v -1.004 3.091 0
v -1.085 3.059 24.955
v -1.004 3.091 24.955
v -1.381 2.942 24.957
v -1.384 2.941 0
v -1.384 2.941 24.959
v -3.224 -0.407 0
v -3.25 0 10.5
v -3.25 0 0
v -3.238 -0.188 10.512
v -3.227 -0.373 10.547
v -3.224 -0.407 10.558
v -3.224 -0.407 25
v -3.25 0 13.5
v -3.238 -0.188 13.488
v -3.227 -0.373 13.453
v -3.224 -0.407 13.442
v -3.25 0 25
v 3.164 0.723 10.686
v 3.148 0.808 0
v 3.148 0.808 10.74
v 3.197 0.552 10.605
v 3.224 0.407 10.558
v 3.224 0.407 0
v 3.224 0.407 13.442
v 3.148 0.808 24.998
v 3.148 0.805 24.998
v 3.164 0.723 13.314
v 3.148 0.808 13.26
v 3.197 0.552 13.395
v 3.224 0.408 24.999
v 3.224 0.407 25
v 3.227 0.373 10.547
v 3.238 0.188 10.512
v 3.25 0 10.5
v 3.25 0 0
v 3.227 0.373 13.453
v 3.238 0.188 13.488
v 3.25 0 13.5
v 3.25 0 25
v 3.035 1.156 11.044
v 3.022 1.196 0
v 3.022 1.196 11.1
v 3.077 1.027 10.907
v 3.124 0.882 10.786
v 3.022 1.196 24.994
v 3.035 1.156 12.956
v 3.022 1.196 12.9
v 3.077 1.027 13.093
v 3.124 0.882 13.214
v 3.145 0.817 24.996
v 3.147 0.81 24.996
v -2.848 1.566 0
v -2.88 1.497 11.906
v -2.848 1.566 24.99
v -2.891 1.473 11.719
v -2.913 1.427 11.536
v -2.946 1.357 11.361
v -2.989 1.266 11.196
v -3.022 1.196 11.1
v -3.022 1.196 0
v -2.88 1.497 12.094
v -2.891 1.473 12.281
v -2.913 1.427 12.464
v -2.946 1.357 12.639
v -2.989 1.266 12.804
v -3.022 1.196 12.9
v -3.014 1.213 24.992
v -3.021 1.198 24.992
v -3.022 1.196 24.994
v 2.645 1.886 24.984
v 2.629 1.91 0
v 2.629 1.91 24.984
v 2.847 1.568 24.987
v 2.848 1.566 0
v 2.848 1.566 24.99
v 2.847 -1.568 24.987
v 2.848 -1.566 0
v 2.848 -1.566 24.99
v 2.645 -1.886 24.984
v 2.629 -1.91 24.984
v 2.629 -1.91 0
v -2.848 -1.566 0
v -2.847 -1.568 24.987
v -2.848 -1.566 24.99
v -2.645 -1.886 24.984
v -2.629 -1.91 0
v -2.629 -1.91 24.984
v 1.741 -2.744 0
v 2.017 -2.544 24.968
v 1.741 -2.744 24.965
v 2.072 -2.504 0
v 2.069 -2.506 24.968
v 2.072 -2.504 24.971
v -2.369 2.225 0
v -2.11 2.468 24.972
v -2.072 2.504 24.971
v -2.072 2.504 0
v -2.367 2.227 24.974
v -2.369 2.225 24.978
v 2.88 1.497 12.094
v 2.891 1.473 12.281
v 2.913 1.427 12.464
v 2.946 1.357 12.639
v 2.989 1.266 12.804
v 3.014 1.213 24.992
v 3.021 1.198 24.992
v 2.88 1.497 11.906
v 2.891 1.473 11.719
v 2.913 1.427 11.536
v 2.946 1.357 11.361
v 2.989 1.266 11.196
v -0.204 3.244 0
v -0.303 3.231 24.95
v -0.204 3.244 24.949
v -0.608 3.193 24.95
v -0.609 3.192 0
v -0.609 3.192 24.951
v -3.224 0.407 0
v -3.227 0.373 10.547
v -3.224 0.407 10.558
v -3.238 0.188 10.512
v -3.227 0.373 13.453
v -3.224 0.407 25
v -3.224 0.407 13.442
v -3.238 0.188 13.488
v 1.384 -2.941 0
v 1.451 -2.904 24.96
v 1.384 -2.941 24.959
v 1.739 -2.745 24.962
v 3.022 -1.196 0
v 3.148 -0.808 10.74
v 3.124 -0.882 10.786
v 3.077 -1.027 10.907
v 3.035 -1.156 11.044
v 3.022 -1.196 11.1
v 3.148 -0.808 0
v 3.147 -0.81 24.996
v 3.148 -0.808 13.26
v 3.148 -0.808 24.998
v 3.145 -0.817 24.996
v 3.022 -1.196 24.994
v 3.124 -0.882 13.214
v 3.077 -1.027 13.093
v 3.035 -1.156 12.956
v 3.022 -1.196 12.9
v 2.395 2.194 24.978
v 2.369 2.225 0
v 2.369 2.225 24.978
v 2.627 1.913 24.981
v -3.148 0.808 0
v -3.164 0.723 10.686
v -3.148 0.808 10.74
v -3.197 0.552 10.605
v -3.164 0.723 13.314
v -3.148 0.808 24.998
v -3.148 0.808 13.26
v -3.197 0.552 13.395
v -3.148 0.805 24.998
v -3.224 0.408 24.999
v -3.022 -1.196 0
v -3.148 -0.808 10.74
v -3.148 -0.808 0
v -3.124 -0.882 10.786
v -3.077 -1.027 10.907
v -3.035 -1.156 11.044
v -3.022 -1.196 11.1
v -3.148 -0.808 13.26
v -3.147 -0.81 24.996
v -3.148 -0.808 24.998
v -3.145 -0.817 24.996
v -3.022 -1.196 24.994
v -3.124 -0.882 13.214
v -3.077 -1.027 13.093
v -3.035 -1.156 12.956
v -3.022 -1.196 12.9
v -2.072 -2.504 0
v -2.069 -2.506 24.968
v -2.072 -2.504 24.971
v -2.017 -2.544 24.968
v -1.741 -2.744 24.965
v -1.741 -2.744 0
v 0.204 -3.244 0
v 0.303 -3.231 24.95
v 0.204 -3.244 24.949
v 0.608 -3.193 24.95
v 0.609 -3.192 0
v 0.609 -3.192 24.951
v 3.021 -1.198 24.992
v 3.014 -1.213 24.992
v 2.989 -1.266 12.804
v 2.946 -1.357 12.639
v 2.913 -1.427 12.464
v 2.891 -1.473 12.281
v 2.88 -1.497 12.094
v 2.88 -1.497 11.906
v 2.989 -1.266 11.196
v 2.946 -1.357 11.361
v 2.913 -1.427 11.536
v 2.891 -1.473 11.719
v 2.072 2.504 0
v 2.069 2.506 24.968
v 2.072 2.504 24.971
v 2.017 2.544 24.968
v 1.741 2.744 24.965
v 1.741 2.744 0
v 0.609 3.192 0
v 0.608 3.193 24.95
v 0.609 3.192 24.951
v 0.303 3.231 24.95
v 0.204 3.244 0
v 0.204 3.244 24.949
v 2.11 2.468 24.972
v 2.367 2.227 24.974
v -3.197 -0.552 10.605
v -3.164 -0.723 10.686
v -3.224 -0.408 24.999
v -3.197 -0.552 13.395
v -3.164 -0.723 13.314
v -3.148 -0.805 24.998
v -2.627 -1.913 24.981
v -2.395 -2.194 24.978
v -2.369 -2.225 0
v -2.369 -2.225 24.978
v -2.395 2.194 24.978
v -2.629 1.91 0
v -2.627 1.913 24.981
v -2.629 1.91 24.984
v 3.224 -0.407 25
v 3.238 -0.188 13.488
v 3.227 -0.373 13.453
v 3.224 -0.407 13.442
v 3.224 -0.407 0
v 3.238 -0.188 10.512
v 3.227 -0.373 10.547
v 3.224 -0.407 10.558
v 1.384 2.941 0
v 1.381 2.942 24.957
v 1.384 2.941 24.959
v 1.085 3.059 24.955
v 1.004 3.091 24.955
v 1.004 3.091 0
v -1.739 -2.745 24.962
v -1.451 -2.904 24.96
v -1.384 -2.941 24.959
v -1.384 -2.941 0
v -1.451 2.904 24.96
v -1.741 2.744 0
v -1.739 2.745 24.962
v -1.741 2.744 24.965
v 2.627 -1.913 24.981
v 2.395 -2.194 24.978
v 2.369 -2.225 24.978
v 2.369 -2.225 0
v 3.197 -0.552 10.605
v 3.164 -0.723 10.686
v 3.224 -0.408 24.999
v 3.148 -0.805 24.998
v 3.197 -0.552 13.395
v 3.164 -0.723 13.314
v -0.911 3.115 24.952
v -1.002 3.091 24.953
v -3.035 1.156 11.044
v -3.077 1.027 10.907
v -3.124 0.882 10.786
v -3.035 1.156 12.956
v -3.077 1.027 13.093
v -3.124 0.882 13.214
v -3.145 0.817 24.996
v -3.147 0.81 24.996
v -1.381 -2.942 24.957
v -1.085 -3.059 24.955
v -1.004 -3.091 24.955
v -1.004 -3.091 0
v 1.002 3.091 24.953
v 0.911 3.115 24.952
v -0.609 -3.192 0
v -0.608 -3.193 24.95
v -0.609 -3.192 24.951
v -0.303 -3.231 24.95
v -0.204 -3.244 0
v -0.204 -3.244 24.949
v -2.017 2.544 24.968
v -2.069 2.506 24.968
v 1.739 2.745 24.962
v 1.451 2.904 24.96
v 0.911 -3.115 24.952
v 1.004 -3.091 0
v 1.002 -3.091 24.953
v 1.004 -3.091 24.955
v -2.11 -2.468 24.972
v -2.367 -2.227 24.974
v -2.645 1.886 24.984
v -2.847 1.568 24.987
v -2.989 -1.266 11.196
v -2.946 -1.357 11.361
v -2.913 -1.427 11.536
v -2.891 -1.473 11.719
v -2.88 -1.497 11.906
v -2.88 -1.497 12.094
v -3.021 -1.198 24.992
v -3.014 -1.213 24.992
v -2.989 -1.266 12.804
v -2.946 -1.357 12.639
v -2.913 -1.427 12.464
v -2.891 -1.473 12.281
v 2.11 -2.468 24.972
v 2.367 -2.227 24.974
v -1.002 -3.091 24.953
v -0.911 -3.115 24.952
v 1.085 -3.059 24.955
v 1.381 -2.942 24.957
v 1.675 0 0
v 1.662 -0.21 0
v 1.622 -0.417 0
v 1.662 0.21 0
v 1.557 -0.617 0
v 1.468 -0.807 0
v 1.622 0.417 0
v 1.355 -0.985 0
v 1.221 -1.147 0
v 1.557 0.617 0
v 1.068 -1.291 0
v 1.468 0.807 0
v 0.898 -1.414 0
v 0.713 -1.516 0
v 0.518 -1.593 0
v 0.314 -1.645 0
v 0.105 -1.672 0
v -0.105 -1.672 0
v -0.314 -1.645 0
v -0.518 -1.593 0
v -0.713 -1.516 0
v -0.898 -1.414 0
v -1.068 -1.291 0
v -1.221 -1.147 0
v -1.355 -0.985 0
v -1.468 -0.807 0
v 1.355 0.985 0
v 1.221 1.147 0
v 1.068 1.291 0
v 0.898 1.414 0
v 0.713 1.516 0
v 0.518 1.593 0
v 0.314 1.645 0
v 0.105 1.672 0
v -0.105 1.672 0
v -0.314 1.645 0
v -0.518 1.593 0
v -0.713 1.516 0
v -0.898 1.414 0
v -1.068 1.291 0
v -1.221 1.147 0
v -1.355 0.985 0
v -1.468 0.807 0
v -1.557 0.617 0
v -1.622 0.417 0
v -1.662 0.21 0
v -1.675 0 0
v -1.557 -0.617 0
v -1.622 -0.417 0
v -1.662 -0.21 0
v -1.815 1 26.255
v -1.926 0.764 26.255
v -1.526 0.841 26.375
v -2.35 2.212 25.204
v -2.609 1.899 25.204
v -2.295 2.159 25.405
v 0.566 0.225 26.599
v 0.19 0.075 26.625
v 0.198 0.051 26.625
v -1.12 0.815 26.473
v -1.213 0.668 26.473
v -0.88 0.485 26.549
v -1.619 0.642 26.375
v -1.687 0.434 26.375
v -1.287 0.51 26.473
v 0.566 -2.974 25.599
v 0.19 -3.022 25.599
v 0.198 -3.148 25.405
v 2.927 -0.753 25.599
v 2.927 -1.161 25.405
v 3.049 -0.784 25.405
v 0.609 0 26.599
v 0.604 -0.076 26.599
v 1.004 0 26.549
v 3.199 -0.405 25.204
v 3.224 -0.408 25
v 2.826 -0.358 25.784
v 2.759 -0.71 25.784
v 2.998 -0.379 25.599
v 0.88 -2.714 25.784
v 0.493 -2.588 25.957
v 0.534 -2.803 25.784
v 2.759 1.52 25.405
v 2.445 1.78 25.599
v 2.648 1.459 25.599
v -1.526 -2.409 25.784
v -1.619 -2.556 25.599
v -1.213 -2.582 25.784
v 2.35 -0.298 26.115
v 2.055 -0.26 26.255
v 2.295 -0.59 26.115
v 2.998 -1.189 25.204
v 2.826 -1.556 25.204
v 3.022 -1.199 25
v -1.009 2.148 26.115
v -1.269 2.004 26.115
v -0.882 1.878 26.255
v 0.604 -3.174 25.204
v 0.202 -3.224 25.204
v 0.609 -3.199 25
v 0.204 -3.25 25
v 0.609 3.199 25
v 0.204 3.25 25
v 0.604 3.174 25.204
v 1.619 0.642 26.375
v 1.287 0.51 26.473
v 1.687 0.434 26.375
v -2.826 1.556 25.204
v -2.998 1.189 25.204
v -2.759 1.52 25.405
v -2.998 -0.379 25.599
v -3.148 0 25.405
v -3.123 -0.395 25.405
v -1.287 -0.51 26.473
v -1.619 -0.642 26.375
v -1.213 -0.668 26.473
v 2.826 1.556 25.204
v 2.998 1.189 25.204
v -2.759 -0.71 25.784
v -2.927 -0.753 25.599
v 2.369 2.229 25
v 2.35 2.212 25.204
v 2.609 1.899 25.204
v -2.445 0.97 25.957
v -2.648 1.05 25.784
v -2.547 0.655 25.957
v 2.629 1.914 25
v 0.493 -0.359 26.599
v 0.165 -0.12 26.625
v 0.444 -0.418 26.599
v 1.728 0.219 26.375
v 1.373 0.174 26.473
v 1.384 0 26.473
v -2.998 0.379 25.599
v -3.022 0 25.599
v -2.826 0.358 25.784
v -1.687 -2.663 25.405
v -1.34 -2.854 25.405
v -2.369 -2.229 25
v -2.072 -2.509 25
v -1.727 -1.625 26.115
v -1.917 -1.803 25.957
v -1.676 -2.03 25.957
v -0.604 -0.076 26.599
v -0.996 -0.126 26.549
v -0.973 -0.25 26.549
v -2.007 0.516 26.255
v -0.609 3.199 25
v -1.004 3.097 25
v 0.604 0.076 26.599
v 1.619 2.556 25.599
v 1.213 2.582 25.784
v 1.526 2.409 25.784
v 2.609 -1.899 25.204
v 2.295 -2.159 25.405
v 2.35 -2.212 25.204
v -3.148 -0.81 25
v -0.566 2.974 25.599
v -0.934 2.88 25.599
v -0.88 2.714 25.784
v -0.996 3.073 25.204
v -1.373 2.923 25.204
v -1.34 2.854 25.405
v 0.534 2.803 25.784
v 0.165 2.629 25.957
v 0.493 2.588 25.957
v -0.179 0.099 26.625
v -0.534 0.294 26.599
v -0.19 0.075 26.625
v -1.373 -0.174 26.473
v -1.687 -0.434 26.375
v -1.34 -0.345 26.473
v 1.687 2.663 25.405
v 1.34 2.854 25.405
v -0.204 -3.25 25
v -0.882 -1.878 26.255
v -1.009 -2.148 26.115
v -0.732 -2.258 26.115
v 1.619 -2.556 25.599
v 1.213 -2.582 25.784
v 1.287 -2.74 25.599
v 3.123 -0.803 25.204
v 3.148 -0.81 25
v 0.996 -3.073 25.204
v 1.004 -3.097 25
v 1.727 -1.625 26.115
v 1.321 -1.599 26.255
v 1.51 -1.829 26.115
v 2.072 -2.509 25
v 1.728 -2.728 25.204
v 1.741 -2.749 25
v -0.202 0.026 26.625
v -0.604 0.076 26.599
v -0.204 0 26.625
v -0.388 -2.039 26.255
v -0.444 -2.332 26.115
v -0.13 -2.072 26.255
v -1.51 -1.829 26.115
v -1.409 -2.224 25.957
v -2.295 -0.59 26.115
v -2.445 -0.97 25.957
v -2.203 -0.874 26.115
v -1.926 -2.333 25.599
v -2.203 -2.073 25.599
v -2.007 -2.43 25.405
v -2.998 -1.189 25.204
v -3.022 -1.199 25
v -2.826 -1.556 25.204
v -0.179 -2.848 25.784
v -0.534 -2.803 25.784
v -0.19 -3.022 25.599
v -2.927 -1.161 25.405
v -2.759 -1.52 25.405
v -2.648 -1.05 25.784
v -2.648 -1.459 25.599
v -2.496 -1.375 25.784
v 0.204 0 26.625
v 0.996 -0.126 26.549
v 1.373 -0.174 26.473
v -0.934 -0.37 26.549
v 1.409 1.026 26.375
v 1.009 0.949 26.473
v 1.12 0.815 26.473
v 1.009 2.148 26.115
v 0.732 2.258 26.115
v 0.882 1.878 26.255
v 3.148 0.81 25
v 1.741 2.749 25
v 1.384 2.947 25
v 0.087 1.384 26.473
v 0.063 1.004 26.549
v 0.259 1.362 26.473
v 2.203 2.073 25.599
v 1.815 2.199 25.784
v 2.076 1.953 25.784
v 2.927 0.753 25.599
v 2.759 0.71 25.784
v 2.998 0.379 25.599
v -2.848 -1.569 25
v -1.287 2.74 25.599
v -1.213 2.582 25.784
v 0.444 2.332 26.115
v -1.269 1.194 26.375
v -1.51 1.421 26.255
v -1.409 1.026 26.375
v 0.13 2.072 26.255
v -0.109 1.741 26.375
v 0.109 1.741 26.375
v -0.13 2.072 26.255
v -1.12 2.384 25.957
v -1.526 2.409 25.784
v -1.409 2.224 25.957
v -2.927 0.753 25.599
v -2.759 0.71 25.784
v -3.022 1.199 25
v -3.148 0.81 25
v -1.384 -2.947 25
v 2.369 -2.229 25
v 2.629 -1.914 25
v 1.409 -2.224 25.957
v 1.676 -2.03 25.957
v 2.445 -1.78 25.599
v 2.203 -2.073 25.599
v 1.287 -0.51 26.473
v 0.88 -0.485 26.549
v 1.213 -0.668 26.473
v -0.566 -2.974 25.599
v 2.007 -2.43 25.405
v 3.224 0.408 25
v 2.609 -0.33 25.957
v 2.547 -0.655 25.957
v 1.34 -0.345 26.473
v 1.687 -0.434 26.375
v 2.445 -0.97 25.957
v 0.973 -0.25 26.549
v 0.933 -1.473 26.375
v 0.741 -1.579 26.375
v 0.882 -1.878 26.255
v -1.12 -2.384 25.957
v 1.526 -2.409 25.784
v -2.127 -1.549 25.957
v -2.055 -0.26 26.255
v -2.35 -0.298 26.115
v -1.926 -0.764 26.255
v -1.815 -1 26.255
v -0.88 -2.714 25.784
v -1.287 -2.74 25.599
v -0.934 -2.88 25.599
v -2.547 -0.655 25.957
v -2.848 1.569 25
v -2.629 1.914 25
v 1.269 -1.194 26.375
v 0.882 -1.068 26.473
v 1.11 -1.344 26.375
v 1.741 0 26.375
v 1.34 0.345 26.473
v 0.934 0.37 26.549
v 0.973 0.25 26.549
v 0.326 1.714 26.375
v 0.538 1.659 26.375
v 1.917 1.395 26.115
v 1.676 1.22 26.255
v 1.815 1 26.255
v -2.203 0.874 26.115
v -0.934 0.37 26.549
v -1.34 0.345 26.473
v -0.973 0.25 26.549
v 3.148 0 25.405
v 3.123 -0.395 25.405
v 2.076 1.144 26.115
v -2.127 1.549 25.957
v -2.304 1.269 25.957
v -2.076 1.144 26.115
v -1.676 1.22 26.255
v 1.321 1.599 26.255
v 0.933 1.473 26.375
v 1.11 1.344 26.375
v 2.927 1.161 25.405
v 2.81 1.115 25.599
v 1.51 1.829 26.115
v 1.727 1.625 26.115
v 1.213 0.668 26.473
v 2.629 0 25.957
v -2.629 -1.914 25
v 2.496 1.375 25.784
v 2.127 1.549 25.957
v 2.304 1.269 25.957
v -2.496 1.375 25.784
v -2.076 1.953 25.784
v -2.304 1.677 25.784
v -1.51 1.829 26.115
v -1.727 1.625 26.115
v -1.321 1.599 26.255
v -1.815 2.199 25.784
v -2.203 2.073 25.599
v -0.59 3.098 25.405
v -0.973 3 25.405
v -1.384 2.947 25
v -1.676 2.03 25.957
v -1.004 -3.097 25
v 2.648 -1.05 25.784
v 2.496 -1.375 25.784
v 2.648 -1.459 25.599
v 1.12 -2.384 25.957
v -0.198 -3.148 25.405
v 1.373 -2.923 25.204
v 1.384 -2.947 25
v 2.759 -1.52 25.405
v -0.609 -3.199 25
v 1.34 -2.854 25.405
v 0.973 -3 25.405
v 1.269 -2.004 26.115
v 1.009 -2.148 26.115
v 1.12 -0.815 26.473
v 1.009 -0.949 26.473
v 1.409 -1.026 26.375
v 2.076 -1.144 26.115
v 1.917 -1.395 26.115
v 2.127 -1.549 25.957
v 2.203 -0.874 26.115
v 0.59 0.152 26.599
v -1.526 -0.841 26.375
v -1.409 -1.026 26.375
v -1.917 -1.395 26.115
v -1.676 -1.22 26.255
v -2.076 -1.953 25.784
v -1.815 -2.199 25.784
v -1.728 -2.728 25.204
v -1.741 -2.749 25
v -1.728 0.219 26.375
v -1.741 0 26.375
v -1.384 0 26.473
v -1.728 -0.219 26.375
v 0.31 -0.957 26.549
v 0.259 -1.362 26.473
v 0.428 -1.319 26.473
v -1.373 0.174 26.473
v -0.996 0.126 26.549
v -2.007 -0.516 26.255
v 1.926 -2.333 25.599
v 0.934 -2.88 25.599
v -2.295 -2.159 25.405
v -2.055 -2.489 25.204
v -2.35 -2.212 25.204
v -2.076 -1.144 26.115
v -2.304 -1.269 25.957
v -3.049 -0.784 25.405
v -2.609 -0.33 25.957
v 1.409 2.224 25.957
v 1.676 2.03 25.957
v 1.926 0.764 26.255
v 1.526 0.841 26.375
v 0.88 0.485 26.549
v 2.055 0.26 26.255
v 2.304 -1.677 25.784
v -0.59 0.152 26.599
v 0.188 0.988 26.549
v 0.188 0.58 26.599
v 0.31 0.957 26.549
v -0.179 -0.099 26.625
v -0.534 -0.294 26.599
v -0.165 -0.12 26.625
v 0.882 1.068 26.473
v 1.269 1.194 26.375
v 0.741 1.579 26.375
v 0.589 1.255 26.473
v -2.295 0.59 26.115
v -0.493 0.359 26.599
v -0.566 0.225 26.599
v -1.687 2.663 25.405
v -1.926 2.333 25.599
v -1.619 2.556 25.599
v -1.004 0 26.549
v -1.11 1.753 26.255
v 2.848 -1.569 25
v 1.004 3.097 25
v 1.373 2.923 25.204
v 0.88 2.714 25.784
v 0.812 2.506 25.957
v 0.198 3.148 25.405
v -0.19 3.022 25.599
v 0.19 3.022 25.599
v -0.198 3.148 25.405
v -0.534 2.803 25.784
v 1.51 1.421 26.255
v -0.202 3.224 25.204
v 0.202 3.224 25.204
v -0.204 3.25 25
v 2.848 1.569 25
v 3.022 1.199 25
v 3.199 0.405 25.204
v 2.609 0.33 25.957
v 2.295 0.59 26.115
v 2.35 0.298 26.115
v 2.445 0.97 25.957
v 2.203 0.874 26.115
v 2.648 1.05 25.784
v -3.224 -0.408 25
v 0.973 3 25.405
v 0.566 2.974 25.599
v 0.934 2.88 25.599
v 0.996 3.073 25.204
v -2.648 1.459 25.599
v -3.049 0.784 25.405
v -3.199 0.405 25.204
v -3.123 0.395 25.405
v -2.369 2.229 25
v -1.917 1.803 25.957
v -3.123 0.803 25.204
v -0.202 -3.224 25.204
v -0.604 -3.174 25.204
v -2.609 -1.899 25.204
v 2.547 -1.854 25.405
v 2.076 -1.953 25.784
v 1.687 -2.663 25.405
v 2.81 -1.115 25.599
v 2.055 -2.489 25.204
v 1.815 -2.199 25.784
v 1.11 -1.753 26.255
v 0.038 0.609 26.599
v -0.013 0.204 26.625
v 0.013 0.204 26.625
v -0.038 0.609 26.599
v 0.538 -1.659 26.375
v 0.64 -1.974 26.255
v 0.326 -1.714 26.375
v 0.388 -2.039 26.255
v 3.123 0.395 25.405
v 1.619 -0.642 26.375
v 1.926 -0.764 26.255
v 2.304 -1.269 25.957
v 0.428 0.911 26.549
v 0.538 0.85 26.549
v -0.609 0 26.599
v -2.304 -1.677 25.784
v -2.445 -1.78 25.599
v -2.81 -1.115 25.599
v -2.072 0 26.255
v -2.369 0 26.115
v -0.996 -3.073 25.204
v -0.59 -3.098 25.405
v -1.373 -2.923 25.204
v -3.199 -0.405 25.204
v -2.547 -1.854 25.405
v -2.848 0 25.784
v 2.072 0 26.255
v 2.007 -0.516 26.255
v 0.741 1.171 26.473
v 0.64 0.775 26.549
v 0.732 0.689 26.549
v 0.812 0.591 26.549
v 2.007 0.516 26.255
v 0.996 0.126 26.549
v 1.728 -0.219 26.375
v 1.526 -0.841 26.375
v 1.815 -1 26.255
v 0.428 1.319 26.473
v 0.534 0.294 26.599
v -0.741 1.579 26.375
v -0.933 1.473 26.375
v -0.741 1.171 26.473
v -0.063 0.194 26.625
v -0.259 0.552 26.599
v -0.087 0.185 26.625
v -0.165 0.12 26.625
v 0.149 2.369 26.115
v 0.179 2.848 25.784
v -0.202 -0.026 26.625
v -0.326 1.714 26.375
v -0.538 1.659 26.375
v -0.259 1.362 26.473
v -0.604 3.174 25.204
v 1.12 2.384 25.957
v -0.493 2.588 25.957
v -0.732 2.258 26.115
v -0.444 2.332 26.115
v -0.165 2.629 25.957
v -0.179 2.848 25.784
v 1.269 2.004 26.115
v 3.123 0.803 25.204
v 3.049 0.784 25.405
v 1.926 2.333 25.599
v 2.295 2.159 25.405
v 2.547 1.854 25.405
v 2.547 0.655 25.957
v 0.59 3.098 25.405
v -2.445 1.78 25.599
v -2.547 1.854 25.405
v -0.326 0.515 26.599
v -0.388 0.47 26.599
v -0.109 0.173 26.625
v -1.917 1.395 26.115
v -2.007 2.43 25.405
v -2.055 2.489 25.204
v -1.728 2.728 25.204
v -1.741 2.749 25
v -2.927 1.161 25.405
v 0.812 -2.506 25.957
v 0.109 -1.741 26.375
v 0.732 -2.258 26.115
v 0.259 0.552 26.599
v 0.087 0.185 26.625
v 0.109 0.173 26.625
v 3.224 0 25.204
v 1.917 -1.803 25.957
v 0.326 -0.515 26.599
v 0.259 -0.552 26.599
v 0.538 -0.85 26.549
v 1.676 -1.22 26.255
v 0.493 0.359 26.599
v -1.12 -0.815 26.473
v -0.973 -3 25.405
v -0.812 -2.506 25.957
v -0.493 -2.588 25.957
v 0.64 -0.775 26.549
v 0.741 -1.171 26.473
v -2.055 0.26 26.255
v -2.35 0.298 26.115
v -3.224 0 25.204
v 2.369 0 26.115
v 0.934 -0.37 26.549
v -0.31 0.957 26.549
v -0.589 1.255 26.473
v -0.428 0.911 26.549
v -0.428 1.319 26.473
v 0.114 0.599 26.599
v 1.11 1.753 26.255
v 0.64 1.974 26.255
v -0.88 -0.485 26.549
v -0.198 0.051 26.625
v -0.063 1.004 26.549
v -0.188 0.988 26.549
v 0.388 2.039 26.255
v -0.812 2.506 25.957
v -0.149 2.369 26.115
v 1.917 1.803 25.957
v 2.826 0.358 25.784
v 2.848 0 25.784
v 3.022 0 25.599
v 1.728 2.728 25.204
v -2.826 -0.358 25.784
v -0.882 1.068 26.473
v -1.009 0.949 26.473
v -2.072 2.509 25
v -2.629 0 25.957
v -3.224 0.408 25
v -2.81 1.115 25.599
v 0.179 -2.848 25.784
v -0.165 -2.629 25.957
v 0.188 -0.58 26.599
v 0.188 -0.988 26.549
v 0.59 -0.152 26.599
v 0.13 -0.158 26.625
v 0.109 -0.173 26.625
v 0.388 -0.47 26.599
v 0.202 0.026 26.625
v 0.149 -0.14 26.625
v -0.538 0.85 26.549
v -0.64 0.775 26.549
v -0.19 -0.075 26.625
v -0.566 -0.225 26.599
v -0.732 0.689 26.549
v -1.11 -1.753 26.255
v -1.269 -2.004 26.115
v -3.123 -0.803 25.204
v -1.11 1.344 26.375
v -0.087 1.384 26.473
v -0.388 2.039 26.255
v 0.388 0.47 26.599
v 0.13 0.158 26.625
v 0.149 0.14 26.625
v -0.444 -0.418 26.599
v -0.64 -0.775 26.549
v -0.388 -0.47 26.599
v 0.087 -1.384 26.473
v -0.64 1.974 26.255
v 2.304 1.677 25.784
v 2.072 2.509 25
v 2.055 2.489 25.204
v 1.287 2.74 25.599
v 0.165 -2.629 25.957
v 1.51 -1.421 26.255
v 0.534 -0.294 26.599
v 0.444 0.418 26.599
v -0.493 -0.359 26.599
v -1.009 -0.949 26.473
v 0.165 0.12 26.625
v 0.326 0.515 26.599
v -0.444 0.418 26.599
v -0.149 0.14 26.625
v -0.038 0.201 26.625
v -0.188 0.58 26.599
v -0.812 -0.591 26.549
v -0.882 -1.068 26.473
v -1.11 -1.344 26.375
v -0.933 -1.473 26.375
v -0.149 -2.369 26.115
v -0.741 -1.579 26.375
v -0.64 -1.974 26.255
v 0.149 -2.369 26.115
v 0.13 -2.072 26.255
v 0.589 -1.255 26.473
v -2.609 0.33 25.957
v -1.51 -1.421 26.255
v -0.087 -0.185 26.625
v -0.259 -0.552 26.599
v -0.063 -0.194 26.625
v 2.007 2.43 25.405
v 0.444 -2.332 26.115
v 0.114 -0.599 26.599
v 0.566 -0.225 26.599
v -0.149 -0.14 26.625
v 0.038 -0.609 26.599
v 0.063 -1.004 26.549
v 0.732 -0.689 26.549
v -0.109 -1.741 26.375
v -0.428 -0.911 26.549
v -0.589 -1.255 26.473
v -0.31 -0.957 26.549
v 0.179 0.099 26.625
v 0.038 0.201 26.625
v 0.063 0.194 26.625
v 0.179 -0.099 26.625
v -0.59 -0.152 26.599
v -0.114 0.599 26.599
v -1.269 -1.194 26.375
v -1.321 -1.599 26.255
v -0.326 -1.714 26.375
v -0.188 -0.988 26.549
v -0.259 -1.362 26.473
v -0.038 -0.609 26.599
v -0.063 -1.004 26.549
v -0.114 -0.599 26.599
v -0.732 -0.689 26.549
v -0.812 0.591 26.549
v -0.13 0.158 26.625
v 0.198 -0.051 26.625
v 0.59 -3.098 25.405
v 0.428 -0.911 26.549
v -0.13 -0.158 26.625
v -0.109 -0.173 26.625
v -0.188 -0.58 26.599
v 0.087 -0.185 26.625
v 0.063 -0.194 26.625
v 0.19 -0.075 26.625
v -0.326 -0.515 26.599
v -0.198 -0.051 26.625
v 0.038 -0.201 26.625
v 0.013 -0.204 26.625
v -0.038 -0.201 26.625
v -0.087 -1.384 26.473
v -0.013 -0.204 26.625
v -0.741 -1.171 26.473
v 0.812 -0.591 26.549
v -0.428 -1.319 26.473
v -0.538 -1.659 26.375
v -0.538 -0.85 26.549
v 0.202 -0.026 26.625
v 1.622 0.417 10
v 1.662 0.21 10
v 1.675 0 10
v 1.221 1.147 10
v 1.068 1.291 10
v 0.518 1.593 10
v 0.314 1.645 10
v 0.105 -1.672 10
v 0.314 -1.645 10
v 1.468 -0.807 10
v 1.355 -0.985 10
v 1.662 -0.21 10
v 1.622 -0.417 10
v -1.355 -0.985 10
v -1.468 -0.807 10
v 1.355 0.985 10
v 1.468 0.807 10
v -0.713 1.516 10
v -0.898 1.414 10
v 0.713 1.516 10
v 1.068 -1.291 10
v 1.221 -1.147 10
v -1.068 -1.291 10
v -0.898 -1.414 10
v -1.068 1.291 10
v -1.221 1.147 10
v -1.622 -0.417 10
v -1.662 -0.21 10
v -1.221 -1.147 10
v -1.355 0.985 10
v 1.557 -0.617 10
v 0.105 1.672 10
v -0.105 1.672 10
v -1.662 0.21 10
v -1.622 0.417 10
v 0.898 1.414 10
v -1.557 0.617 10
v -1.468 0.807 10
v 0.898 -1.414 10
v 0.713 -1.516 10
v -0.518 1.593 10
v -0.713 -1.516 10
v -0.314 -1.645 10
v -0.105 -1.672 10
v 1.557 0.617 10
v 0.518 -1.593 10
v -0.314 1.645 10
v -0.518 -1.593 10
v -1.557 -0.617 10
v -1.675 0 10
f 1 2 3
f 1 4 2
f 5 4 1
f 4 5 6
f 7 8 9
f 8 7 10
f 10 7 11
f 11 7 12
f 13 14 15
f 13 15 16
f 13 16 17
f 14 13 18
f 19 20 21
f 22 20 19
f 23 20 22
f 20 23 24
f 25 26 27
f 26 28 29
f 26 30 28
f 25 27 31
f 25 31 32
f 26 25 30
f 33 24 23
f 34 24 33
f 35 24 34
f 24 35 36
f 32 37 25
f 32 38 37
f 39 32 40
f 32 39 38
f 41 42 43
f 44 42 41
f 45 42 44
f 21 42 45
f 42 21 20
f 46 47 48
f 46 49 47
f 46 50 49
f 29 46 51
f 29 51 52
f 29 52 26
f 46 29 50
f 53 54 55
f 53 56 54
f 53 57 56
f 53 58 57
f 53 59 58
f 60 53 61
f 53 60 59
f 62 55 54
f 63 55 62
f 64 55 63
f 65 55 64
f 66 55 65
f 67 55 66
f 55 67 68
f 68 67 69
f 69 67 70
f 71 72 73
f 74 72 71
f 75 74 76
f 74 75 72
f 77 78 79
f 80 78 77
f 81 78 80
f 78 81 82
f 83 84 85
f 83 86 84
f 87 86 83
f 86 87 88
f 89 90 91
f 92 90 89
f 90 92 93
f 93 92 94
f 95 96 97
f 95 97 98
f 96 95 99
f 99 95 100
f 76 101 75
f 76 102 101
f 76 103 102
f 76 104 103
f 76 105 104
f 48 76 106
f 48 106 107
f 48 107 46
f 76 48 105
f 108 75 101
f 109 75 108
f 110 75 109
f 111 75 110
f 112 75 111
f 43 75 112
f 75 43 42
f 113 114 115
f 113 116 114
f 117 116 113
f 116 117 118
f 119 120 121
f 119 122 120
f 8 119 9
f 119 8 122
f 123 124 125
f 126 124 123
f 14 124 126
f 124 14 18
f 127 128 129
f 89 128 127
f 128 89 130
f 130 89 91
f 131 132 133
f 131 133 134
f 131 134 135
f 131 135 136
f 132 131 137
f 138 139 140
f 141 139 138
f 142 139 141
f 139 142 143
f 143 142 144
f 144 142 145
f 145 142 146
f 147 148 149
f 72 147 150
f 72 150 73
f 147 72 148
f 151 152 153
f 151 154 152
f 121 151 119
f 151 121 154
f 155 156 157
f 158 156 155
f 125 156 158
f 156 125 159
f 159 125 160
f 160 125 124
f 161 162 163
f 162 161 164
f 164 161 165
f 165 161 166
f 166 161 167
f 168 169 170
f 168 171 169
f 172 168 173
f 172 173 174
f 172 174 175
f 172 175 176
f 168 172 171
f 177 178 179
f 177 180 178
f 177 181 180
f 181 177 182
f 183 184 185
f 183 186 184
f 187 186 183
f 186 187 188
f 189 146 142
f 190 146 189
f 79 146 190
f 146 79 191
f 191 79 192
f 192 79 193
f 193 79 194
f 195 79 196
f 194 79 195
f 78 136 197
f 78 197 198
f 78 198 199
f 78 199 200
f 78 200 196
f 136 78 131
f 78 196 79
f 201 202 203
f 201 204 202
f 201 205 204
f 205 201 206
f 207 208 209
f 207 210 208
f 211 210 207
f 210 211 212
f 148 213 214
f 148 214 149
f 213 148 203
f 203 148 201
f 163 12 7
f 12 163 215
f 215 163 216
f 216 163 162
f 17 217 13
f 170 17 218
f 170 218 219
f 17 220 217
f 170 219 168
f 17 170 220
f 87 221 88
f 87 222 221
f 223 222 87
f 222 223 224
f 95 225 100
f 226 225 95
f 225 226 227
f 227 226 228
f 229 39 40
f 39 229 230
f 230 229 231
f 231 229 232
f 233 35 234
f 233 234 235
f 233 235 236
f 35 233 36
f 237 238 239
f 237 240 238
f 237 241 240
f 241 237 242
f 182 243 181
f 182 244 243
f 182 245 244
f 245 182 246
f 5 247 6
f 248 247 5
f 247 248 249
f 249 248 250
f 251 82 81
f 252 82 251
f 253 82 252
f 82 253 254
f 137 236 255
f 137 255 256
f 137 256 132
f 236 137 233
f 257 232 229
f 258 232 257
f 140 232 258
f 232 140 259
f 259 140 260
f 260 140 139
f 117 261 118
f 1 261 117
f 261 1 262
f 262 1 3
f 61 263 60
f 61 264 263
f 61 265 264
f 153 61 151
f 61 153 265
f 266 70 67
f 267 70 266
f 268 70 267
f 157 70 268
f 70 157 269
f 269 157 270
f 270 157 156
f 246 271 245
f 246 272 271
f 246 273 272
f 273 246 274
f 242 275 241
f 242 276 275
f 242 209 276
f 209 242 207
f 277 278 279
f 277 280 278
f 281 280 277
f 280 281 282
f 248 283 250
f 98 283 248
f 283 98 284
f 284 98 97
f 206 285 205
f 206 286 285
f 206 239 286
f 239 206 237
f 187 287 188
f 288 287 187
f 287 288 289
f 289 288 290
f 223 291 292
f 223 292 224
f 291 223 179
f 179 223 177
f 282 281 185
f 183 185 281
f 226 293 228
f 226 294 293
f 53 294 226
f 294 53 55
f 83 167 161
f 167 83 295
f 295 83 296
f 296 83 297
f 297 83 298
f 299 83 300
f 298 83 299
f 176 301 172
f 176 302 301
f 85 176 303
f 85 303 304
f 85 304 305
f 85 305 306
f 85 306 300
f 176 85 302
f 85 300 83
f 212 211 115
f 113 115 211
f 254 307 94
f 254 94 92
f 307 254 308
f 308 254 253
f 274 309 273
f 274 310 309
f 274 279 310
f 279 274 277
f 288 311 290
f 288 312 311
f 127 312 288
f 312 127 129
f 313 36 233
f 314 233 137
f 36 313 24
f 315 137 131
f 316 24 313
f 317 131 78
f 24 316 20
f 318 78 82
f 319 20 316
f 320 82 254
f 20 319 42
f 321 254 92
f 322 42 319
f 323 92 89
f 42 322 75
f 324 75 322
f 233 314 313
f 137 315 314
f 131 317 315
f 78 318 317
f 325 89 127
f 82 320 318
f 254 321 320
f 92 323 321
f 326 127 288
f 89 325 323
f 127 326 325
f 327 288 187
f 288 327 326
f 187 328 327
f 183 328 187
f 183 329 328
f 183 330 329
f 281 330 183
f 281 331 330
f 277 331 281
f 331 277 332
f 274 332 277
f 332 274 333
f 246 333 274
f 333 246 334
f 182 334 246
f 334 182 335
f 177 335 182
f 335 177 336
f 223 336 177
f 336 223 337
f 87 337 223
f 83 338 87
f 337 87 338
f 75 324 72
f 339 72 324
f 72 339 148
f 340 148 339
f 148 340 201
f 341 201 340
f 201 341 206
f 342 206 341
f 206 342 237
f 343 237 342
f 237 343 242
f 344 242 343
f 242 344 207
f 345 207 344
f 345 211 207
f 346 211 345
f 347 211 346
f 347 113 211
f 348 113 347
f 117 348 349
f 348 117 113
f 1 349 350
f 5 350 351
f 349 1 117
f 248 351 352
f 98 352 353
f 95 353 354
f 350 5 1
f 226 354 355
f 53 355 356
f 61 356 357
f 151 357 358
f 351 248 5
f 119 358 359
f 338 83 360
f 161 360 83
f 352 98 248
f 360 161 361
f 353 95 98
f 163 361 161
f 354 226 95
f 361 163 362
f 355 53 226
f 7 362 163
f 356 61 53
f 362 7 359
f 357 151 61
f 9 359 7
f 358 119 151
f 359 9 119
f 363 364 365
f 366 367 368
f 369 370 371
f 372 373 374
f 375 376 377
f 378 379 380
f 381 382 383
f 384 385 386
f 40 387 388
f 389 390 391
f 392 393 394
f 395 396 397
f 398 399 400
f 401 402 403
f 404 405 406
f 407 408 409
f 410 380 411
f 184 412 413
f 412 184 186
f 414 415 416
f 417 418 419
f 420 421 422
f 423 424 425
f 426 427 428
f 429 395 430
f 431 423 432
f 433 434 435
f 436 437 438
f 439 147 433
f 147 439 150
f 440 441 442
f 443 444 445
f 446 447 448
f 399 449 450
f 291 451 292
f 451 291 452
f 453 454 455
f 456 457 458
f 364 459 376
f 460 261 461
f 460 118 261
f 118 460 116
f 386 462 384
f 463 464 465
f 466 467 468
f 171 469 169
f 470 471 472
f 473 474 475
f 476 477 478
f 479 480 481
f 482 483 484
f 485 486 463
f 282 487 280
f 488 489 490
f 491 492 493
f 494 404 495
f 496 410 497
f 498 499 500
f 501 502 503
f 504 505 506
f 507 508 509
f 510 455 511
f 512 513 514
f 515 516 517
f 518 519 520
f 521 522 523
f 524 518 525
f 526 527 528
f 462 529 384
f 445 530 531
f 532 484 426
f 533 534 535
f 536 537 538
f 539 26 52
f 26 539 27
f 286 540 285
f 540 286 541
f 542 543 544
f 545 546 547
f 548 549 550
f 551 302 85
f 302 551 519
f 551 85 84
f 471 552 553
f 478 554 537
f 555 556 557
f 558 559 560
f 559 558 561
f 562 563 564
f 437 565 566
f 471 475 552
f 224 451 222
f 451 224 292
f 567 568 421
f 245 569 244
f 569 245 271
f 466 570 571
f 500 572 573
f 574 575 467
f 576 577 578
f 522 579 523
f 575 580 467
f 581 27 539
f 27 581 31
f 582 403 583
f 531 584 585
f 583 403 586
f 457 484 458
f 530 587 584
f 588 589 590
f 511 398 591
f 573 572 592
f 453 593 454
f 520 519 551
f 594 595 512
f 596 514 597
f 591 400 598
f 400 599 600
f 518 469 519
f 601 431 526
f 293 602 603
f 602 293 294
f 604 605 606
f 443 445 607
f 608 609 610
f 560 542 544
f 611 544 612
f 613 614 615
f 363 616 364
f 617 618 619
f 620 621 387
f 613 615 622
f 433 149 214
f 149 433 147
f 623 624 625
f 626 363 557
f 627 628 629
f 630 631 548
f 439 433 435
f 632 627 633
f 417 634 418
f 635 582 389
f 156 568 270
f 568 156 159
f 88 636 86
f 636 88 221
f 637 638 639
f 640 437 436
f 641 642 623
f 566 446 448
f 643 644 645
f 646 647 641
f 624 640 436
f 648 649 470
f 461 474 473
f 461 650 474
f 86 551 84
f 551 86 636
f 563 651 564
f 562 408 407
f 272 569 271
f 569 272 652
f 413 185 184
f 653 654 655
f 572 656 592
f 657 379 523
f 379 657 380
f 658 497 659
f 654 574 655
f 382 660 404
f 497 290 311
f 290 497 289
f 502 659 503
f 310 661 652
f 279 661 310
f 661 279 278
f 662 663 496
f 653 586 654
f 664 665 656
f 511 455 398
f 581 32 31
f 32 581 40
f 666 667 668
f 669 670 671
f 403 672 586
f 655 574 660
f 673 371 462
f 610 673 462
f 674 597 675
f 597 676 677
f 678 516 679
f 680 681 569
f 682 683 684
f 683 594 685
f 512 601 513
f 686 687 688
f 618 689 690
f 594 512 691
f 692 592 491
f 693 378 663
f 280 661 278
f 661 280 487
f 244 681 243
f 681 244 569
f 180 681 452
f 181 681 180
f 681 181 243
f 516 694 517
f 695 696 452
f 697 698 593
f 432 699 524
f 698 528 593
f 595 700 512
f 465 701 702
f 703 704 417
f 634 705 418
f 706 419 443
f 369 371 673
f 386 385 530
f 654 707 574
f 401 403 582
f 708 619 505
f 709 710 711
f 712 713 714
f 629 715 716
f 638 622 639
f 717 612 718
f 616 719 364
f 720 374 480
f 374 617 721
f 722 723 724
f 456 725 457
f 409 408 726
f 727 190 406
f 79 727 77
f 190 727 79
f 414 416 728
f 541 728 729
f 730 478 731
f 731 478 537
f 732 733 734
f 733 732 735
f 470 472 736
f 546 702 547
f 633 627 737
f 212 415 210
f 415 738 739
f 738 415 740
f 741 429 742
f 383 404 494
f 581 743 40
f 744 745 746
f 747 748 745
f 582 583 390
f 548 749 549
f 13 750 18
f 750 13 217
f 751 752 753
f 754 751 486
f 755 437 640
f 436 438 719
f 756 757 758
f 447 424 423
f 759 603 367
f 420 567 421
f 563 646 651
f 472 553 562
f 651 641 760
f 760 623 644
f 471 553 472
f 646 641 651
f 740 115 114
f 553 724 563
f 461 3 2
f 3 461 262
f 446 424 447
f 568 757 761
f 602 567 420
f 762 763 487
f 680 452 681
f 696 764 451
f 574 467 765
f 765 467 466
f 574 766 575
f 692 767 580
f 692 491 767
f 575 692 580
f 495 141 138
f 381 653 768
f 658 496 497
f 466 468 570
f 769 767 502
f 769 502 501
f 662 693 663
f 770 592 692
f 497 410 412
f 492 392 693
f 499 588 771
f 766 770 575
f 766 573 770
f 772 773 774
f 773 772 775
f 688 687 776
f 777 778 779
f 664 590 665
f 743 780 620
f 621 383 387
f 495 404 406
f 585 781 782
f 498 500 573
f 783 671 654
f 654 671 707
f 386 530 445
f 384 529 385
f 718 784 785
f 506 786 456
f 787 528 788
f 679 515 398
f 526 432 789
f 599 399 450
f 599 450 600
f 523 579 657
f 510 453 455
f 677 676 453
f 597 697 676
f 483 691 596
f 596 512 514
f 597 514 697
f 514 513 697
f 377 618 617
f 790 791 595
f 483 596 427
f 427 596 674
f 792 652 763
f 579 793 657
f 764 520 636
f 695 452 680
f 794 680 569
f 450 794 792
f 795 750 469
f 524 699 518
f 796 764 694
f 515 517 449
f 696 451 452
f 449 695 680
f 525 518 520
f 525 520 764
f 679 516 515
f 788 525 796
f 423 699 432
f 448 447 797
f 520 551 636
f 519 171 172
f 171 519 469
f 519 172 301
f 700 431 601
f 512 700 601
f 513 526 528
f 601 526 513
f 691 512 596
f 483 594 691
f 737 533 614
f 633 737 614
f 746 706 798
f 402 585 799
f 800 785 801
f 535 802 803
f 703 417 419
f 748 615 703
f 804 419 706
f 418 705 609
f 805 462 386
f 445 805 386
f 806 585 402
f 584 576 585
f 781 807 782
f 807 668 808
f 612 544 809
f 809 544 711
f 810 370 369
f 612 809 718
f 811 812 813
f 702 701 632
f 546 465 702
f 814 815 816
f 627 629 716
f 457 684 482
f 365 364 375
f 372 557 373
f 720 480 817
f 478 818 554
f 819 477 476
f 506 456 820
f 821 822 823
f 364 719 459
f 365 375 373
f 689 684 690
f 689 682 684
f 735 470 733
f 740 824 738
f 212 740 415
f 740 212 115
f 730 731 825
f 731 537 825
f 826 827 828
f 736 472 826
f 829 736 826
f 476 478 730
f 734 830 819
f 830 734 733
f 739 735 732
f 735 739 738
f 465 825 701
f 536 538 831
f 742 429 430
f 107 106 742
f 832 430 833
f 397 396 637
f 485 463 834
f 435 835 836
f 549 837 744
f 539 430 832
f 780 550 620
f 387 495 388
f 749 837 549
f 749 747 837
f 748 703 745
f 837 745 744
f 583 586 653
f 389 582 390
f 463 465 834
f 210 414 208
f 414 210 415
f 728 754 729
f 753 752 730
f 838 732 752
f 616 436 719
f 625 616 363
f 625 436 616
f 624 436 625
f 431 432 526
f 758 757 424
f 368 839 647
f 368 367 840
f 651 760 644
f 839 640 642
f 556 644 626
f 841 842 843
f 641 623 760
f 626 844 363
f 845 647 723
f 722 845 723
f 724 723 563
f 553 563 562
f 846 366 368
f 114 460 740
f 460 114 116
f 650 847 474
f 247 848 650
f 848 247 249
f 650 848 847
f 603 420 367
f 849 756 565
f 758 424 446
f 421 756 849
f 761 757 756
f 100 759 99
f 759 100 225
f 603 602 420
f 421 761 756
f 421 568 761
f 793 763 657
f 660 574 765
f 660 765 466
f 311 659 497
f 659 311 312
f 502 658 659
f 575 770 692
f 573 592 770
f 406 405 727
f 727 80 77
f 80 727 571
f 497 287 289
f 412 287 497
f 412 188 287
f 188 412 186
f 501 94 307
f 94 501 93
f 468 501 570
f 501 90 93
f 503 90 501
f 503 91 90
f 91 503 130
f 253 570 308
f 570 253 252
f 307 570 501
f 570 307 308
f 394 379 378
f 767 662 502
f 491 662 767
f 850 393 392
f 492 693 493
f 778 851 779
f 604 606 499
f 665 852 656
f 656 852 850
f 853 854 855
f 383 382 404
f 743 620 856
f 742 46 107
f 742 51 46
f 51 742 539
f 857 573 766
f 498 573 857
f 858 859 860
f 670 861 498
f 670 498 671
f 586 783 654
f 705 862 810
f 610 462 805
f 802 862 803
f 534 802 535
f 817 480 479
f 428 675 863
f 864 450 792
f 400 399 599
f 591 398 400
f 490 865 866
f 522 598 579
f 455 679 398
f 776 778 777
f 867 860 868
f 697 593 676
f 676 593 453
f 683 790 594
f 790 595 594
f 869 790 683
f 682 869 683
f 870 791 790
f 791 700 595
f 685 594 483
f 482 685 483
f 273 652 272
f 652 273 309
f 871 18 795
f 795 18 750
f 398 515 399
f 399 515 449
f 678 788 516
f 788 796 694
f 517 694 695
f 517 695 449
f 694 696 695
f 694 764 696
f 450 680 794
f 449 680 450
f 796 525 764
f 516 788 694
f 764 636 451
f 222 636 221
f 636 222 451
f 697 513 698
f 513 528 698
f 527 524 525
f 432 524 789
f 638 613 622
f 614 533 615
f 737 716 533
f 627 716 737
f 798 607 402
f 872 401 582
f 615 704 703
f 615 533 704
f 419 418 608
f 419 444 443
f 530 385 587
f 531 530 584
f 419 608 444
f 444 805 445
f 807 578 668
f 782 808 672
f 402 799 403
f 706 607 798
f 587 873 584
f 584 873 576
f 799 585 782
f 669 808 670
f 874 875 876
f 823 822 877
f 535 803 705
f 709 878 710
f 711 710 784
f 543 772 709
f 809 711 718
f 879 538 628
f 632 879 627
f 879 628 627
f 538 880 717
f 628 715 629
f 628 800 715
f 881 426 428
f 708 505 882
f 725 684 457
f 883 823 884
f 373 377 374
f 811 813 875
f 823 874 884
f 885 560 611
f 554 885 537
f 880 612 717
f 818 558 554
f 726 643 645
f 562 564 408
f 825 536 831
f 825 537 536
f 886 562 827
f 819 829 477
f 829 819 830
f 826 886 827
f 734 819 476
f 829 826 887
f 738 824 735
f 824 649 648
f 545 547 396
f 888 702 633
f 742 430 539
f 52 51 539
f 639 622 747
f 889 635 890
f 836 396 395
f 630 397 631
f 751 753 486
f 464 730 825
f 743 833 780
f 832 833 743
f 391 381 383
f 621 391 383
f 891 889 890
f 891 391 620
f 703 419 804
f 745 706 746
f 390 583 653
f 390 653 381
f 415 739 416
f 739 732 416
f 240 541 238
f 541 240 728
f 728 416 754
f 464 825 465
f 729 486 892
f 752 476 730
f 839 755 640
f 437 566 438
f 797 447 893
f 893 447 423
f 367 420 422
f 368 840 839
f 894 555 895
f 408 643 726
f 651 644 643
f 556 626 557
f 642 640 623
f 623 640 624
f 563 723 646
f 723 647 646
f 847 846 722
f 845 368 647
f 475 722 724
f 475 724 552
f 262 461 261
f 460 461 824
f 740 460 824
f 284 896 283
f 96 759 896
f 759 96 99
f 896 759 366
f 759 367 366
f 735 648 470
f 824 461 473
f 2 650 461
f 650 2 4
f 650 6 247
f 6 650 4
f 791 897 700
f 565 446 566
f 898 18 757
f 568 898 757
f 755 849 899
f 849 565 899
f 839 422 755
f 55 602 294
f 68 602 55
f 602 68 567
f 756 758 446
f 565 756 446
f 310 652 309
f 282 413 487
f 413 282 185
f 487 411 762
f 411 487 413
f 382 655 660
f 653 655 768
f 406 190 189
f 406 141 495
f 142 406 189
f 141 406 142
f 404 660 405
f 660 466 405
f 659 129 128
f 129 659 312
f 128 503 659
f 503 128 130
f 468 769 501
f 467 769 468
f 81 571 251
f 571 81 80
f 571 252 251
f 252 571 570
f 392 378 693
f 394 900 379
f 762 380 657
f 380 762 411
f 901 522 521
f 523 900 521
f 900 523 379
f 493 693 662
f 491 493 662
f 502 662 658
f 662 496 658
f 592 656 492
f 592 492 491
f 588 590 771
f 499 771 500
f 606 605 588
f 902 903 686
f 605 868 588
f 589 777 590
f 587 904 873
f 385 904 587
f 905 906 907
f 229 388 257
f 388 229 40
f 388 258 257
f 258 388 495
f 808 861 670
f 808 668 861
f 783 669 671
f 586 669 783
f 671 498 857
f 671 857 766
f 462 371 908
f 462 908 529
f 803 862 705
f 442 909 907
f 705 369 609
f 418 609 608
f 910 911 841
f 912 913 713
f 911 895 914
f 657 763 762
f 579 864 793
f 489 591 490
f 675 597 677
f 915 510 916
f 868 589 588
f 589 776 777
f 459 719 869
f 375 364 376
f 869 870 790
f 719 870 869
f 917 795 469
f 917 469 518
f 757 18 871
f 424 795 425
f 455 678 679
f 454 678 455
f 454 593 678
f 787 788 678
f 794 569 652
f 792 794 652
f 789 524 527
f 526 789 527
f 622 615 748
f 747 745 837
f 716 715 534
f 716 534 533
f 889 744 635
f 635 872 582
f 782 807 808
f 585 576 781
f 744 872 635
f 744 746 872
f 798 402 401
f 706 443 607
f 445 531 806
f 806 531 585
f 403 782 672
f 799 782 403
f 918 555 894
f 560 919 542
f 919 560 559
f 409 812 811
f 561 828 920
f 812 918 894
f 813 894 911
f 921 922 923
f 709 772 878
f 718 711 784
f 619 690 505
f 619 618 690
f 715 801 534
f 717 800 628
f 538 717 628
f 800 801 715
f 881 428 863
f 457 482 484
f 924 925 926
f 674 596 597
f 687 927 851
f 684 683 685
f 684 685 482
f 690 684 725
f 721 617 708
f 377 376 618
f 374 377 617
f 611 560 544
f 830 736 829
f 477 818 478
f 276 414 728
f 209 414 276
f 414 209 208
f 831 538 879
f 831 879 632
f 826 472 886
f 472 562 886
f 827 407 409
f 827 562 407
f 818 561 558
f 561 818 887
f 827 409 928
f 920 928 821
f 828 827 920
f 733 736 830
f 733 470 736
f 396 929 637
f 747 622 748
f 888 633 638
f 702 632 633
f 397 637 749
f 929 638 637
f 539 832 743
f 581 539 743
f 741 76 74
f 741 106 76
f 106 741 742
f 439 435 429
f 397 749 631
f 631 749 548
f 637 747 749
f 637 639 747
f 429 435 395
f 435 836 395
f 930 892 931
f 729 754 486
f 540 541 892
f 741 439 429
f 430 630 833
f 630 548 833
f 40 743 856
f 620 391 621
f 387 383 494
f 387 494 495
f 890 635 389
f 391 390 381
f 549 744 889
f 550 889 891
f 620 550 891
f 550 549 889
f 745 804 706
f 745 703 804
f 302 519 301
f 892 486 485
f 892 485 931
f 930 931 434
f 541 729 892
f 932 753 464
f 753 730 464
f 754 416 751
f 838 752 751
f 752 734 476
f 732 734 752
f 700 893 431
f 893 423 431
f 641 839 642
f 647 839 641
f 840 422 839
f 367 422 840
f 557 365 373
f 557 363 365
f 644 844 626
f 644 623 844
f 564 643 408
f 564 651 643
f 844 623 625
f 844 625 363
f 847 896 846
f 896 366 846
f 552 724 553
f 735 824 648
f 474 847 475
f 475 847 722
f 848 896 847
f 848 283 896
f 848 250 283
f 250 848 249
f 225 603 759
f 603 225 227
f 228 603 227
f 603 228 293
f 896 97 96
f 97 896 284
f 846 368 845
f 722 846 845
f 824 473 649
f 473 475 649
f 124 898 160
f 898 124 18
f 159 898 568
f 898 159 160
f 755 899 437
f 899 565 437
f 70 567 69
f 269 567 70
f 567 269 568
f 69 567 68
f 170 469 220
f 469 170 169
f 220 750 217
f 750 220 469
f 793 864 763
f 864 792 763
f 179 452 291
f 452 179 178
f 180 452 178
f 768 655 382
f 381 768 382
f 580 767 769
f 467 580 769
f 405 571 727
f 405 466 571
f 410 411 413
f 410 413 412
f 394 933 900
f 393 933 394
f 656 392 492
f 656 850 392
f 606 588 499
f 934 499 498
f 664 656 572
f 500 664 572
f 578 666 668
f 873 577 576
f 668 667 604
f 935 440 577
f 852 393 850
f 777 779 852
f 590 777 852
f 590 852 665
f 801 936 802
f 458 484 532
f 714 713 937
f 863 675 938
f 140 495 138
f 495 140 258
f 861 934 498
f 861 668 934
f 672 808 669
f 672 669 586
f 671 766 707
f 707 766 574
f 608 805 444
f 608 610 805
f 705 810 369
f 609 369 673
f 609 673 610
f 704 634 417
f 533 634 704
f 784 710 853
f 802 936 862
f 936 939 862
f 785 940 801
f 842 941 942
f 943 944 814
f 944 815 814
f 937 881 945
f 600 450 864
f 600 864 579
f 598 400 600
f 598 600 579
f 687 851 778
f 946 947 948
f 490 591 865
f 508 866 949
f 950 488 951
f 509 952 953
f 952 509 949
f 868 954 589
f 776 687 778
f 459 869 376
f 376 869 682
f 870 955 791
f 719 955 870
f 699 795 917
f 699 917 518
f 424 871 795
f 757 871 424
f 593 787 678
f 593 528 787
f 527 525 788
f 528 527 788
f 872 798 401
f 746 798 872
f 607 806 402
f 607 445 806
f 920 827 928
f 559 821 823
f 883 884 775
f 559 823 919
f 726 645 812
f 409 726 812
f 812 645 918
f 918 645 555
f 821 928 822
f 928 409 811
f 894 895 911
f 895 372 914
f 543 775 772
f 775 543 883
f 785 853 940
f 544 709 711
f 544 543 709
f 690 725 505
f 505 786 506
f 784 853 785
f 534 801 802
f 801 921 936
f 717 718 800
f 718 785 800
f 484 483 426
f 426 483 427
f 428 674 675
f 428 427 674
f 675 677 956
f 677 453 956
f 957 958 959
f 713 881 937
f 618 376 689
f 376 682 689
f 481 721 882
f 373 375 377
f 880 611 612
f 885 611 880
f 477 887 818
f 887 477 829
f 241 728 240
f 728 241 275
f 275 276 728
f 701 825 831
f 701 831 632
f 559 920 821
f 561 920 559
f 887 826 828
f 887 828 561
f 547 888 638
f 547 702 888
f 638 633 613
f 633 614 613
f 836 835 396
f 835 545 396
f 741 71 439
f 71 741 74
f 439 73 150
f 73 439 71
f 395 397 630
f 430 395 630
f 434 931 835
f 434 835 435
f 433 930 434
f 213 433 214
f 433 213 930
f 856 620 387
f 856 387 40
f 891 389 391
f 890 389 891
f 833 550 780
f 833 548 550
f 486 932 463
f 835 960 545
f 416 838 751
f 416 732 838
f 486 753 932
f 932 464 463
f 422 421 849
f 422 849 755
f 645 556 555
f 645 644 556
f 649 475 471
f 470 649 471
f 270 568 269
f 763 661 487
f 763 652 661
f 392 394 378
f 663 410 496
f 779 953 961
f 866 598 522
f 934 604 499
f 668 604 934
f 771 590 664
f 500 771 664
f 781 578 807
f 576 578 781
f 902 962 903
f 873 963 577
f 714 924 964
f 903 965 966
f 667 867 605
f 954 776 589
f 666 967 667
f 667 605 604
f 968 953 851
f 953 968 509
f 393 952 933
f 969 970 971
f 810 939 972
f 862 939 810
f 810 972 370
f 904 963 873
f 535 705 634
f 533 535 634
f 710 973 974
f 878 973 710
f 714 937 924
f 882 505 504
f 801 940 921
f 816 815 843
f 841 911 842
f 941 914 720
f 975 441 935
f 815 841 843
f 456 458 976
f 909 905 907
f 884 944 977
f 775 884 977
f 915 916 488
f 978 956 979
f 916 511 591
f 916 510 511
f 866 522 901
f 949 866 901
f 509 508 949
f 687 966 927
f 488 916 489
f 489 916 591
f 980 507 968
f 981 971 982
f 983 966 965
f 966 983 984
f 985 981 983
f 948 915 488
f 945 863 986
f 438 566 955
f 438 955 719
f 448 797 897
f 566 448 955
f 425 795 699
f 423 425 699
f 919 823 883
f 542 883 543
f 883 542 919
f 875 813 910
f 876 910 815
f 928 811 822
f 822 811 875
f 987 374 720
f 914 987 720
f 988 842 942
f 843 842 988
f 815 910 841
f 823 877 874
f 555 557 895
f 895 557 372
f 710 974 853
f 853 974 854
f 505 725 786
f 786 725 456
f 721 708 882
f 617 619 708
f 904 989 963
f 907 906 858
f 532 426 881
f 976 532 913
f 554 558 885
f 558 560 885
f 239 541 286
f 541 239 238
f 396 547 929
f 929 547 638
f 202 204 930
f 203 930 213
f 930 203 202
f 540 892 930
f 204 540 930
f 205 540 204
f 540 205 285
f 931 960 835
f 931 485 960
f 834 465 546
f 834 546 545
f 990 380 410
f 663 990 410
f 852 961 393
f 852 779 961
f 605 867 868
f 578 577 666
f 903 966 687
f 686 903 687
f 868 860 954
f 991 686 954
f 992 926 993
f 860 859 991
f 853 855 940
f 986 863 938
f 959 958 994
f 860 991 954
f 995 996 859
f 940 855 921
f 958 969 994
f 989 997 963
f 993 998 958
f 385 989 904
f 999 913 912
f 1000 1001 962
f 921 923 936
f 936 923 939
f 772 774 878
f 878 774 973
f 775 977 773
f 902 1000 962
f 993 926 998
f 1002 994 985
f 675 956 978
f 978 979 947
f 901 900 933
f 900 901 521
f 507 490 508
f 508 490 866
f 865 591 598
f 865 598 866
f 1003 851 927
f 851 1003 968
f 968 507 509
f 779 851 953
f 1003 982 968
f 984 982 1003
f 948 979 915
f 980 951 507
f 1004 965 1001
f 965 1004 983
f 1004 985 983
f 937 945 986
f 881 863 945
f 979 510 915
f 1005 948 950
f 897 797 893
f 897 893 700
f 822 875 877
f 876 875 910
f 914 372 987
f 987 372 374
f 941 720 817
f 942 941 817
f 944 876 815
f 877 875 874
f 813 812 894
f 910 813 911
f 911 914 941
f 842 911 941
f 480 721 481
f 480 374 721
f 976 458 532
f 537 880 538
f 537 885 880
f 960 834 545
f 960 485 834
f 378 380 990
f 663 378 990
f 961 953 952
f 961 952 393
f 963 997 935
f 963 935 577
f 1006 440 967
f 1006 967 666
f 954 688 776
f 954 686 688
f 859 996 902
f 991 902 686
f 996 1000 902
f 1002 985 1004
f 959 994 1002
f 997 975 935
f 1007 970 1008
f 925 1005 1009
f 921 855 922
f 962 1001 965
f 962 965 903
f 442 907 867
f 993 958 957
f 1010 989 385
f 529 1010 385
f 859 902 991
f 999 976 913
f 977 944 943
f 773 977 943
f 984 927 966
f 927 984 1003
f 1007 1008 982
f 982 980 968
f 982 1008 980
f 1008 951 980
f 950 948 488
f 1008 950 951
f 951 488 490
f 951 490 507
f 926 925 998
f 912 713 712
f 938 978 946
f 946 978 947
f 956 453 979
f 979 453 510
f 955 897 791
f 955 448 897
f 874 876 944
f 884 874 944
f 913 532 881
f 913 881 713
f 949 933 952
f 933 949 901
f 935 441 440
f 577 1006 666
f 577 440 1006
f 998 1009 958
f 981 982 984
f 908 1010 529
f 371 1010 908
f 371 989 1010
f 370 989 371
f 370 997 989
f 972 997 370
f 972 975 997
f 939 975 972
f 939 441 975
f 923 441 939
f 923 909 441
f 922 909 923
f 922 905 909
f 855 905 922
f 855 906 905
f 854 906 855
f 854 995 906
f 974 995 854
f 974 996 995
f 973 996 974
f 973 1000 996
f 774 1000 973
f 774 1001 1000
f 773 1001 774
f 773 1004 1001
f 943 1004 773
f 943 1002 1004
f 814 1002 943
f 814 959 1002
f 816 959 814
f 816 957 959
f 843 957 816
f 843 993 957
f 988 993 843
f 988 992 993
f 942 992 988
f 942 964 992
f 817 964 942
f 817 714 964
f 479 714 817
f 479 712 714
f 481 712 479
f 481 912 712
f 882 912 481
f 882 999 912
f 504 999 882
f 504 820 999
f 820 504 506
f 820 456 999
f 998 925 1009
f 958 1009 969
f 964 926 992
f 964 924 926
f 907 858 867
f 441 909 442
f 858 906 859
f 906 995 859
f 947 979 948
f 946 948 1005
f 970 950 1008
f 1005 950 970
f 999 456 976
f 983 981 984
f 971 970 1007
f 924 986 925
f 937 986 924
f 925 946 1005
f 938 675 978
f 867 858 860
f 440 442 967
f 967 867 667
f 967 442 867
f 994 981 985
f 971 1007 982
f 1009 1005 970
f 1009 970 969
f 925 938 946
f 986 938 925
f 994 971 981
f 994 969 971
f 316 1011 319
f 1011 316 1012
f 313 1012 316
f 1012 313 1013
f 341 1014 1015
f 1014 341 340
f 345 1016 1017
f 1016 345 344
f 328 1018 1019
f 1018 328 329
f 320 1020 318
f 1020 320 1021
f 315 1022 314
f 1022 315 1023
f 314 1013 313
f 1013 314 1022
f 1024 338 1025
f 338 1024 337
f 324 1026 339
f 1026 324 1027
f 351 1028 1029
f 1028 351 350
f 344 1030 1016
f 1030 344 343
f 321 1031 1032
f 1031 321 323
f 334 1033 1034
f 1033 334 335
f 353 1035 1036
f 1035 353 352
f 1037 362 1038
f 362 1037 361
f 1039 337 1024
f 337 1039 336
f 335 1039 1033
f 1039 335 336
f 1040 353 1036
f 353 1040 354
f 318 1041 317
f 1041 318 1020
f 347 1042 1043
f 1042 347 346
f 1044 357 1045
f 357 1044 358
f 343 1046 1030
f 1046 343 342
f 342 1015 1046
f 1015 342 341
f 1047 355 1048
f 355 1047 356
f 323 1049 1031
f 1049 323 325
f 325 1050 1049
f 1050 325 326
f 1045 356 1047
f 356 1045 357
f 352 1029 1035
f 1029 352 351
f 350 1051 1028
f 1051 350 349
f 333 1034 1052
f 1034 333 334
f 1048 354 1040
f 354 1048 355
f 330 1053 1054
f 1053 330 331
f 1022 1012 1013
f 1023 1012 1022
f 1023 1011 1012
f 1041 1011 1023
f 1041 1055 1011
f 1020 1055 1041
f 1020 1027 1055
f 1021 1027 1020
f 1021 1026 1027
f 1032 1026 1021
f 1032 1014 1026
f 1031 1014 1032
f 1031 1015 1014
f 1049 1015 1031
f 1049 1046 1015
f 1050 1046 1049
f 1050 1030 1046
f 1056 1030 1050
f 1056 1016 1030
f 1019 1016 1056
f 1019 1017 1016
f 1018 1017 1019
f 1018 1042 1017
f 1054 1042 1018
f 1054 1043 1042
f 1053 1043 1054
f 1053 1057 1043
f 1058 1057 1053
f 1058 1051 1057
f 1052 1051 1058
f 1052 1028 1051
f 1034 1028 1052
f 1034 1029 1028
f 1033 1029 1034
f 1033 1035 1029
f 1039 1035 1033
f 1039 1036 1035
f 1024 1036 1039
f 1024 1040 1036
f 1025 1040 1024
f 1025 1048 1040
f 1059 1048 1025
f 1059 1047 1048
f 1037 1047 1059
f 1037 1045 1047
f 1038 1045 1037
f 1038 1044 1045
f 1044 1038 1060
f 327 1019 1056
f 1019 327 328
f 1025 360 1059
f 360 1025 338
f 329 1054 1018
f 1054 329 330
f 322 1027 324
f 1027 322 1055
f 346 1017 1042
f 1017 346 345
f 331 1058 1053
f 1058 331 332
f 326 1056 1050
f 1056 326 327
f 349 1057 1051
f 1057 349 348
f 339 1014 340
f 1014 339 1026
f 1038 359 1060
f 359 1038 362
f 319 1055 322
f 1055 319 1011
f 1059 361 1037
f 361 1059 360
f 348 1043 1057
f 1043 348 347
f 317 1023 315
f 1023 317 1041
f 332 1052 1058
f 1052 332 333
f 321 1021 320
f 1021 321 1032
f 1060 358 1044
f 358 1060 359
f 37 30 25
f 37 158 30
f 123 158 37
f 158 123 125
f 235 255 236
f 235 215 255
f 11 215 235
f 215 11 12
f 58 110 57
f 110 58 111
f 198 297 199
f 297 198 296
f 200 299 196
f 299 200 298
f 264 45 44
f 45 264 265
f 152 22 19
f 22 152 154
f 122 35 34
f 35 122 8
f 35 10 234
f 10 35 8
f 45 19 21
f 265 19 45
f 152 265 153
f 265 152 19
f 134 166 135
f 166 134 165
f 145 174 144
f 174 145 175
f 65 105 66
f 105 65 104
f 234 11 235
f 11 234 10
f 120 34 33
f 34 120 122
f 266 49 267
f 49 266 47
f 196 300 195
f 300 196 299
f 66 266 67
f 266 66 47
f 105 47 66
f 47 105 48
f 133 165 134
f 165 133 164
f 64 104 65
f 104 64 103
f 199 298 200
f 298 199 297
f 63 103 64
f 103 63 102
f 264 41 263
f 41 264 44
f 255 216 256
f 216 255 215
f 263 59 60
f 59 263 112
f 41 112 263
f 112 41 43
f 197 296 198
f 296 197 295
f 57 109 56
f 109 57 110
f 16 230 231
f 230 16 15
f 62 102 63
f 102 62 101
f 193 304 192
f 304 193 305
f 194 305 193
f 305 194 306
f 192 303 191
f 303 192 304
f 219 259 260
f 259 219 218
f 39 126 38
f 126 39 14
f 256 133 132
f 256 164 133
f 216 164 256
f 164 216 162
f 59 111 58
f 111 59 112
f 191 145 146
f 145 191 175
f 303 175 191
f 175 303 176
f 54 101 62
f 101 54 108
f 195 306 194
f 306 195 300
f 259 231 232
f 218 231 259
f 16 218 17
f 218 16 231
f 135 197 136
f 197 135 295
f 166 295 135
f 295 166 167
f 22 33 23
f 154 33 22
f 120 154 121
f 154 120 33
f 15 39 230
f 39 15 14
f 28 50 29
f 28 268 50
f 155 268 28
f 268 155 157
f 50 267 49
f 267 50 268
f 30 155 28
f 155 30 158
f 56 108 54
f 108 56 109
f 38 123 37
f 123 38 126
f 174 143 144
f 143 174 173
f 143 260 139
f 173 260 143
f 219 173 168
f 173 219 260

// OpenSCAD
HEIGHT = 25;
DIAMETER= 6.5;
INNER_HOLE_DIAMETER = 3.35;
INNER_HOLE_HEIGHT = 10;

$fn = 50;

difference() {
    union () {
        cylinder(h = HEIGHT, d = DIAMETER);
        translate([0, 0, HEIGHT]) resize([DIAMETER, DIAMETER, DIAMETER / 2]) sphere(d = DIAMETER);
    }
    cylinder(h = INNER_HOLE_HEIGHT, d = INNER_HOLE_DIAMETER);
    translate([0, 0, 12
  ]) rotate([0, 90, 0]) cylinder(h = DIAMETER + 2, d = 3, center = true);
}
